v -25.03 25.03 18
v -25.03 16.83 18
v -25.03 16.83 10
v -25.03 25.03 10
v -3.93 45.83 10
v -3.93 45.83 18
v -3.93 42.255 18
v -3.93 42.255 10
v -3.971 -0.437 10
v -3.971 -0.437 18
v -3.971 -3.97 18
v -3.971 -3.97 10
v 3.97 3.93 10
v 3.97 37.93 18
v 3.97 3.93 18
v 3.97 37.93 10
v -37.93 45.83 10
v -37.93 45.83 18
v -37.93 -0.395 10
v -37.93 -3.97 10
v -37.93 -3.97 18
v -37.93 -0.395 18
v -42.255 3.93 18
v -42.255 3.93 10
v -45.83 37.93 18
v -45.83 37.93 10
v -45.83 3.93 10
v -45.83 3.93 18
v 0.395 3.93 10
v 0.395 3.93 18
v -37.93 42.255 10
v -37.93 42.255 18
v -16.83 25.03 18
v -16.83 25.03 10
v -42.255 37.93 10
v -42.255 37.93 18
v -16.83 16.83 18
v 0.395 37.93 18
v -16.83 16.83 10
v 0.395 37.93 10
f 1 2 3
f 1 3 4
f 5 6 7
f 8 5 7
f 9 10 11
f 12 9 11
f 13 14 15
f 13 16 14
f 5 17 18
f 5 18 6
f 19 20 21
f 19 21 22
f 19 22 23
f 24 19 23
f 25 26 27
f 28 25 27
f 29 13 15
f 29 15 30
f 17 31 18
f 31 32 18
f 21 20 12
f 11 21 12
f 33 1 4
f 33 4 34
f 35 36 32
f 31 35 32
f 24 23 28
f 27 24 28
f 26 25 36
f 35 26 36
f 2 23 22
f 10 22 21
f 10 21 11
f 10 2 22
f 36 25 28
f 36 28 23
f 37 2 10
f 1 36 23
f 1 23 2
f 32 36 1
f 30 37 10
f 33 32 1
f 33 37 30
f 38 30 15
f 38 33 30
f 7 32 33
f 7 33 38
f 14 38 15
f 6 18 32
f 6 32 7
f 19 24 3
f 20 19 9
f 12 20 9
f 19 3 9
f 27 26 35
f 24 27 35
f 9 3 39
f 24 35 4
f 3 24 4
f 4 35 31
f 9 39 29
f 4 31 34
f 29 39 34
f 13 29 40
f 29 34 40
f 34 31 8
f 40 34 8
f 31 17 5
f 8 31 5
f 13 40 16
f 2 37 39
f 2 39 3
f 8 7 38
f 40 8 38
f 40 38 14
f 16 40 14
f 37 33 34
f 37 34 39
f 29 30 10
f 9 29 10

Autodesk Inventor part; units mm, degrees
ref_plane "YZ Plane" through (0, 0, 0) normal (1, 0, 0) x (0, 1, 0)
ref_plane "XZ Plane" through (0, 0, 0) normal (0, 1, 0) x (-1, 0, 0)
ref_plane "Work Plane1" through (0, 0, 10) normal (0, 0, 1) x (1, 0, 0)
sketch "Sketch1" plane through (0, 0, 10) normal (0, 0, 1) x (1, 0, 0)
  line L0 (-4.0299, -0.3538) -> (-2.2322, 1.4439) construction
  arc A0 (-1.4439, 2.2322) -> (-2.2322, 1.4439) centre (-0.9299, 0.9299) ccw construction
  line L1 (-1.4439, 2.2322) -> (0.3538, 4.0299) construction
  line L2 (-37.8299, 42.8299) -> (-37.8299, 37.8299) construction
  line L3 (-37.8299, 37.8299) -> (-42.9208, 37.8299) construction
  line L4 (-37.8299, 42.2137) -> (-37.8299, 45.8299) construction
  line L5 (-37.8299, 45.8299) -> (-4.0299, 45.8299) construction
  line L6 (-4.0299, 45.8299) -> (-4.0299, 42.2137) construction
  line L7 (-4.0299, 4.0299) -> (0.3538, 4.0299) projected
  circle A1 centre (-20.9299, 20.9299) radius 17.5 projected
  line L8 (-20.9299, 58.9723) -> (17.1124, 20.9299) construction
  line L9 (17.1124, 20.9299) -> (-20.9299, -17.1124) construction
  line L10 (-20.9299, -17.1124) -> (-58.9723, 20.9299) construction
  line L11 (-58.9723, 20.9299) -> (-20.9299, 58.9723) construction
  line L12 (-20.9299, 58.9723) -> (-20.9299, -17.1124) construction
  line L13 (17.1124, 20.9299) -> (-58.9723, 20.9299) construction
  line L14 (-20.9299, 58.9723) -> (32.8701, 58.9723) construction
  line L15 (-43.4299, 43.4299) -> (1.5701, 43.4299) construction
  line L16 (1.5701, 43.4299) -> (1.5701, -1.5701) construction
  line L17 (1.5701, -1.5701) -> (-43.4299, -1.5701) construction
  line L18 (-43.4299, -1.5701) -> (-43.4299, 43.4299) construction
  line L19 (-43.4299, 43.4299) -> (1.5701, -1.5701) construction
  line L20 (1.5701, 43.4299) -> (-43.4299, -1.5701) construction
  line L21 (-43.4299, 5.3876) -> (-43.4299, 36.4723)
  line L22 (-43.4299, 36.4723) -> (-36.4723, 43.4299)
  line L23 (-36.4723, 43.4299) -> (-5.3876, 43.4299)
  line L24 (-5.3876, 43.4299) -> (1.5701, 36.4723)
  line L25 (1.5701, 36.4723) -> (1.5701, 5.3876)
  line L26 (1.5701, 5.3876) -> (-5.3876, -1.5701)
  line L27 (-5.3876, -1.5701) -> (-36.4723, -1.5701)
  line L28 (-36.4723, -1.5701) -> (-43.4299, 5.3876)
  line L29 (-4.0299, 42.2137) -> (-37.8299, 42.2137) projected
  line L30 (-4.0299, -0.3538) -> (-4.0299, 4.0299) projected
  circle A2 centre (-20.9299, 20.9299) radius 1.5
  line L31 (-10.9299, 10.9299) -> (-30.9299, 10.9299) construction
  line L32 (-30.9299, 10.9299) -> (-30.9299, 30.9299) construction
  line L33 (-30.9299, 30.9299) -> (-10.9299, 30.9299) construction
  line L34 (-10.9299, 30.9299) -> (-10.9299, 10.9299) construction
  line L35 (-10.9299, 10.9299) -> (-30.9299, 30.9299) construction
  line L36 (-30.9299, 10.9299) -> (-10.9299, 30.9299) construction
  circle A3 centre (-30.9299, 30.9299) radius 1.4
  circle A4 centre (-30.9299, 10.9299) radius 1.4
  circle A5 centre (-10.9299, 10.9299) radius 1.4
  line L37 (-45.8299, 37.8299) -> (-42.0723, 37.8299) construction
  line L38 (-42.1723, 37.7299) -> (-45.8299, 37.7299)
  line L39 (-45.8299, 37.7299) -> (-45.8299, 4.1299)
  line L40 (-45.8299, 4.1299) -> (-42.1723, 4.1299)
  line L41 (-42.1723, 4.1299) -> (-42.1723, 37.7299)
  line L42 (-45.8299, 4.0299) -> (-42.0723, 4.0299) construction
  line L43 (-45.8299, 37.8299) -> (-42.0723, 37.8299) projected
  line L44 (-37.7299, 45.8299) -> (-4.1299, 45.8299)
  line L45 (-4.1299, 45.8299) -> (-4.1299, 42.1723)
  line L46 (-4.1299, 42.1723) -> (-37.7299, 42.1723)
  line L47 (-37.7299, 42.1723) -> (-37.7299, 45.8299)
  line L48 (0.4701, 37.8299) -> (0.4701, 4.0299) construction
  line L49 (0.4701, 4.0299) -> (3.9701, 4.0299) construction
  line L50 (3.9701, 37.8299) -> (3.9701, 4.0299) construction
  line L51 (0.4701, 37.8299) -> (3.9701, 37.8299) construction
  line L52 (-45.8299, -3.9701) -> (-4.0299, -3.9701) construction
  line L53 (0.3124, 37.7299) -> (3.9701, 37.7299)
  line L54 (3.9701, 37.7299) -> (3.9701, 4.1299)
  line L55 (3.9701, 4.1299) -> (0.3124, 4.1299)
  line L56 (0.3124, 4.1299) -> (0.3124, 37.7299)
  line L57 (-4.1713, -0.3538) -> (-37.7299, -0.3538)
  line L58 (-37.7299, -0.3538) -> (-37.7299, -3.9701)
  line L59 (-37.7299, -3.9701) -> (-4.1713, -3.9701)
  line L60 (-4.1713, -3.9701) -> (-4.1713, -0.3538)
  point P0 (-37.8299, 4.0299)
  dimension "d18" = 53.8
  dimension "d19" = 45
  dimension "d20" = 53.8
  dimension "d21" = 45
  dimension "d22" = 45
  dimension "d30" = 20
  dimension "d31" = 20
  dimension "d32" = 2.8
  dimension "d33" = 2.8
  dimension "d34" = 2.8
  dimension "d35" = 3
  dimension "d36" = 0.1
  dimension "d37" = 0.1
  dimension "d38" = 0.1
  dimension "d39" = 0.1
extrude "Extrusion1" add sketch "Sketch1" along normal blind 8 contours L30 L26 L57 L28 L41 L22 L46 L24 L56 L7 | L7 L26 L30 | L56 L24 L25 L26 | L26 L25 L24 L53 L54 L55 | L60 L59 L58 L57 L28 L27 L26 | L26 L27 L28 L57 | L46 L22 L29 L24 | L24 L29 L45 | L40 L39 L38 L22 L21 L28 | L28 L21 L22 L41 | L29 L22 L23 L24 | L24 L23 L22 L29 L47 L44 L45 | L47 L29 L22 | A1 | A2 | A3 | A4 | A5
sketch "Skizze4" plane through (0, 0, 18) normal (0, 0, 1) x (1, 0, 0)
  line L0 (-37.7299, 42.1723) -> (-42.1723, 37.7299) projected
  line L1 (-42.1723, 37.7299) -> (-45.8299, 37.7299) projected
  line L2 (-45.8299, 37.7299) -> (-45.8299, 4.1299) construction
  line L3 (-45.8299, 4.1299) -> (-42.1723, 4.1299) projected
  line L4 (-42.1723, 4.1299) -> (-37.6885, -0.3538) projected
  line L5 (-37.6885, -0.3538) -> (-37.7299, -0.3538) projected
  line L6 (-37.7299, -0.3538) -> (-37.7299, -3.9701) projected
  line L7 (-37.7299, -3.9701) -> (-4.1713, -3.9701) construction
  line L8 (-4.1713, -3.9701) -> (-4.1713, -0.3538) projected
  line L9 (-4.1713, -0.3538) -> (0.3124, 4.1299) projected
  line L10 (0.3124, 4.1299) -> (3.9701, 4.1299) projected
  line L11 (3.9701, 4.1299) -> (3.9701, 37.7299) construction
  line L12 (3.9701, 37.7299) -> (0.3124, 37.7299) projected
  line L13 (0.3124, 37.7299) -> (-4.1299, 42.1723) projected
  line L14 (-4.1299, 42.1723) -> (-4.1299, 45.8299) projected
  line L15 (-4.1299, 45.8299) -> (-37.7299, 45.8299) construction
  line L16 (-37.7299, 45.8299) -> (-37.7299, 42.1723) projected
  line L17 (-37.9299, 46.0299) -> (-3.9299, 46.0299) construction
  line L18 (-3.9299, 46.0299) -> (-3.9299, 42.2551)
  line L19 (-3.9299, 42.2551) -> (0.3953, 37.9299)
  line L20 (0.3953, 37.9299) -> (4.1701, 37.9299)
  line L21 (4.1701, 37.9299) -> (4.1701, 3.9299) construction
  line L22 (4.1701, 3.9299) -> (0.3953, 3.9299)
  line L23 (0.3953, 3.9299) -> (-3.9713, -0.4367)
  line L24 (-3.9713, -0.4367) -> (-3.9713, -4.1701)
  line L25 (-3.9713, -4.1701) -> (-37.9299, -4.1701) construction
  line L26 (-37.9299, -4.1701) -> (-37.9299, -0.3953)
  line L27 (-37.9299, -0.3953) -> (-42.2551, 3.9299)
  line L28 (-42.2551, 3.9299) -> (-46.0299, 3.9299)
  line L29 (-46.0299, 3.9299) -> (-46.0299, 37.9299) construction
  line L30 (-46.0299, 37.9299) -> (-42.2551, 37.9299)
  line L31 (-42.2551, 37.9299) -> (-37.9299, 42.2551)
  line L32 (-37.9299, 42.2551) -> (-37.9299, 46.0299)
  line L33 (-45.8299, 37.7299) -> (-45.8299, 37.9299)
  line L34 (-4.1299, 45.8299) -> (-37.7299, 45.8299) projected
  line L35 (-37.7299, 45.8299) -> (-37.9299, 45.8299)
  line L36 (-4.1299, 45.8299) -> (-3.9299, 45.8299)
  line L37 (3.9701, 37.7299) -> (3.9701, 37.9299)
  line L38 (3.9701, 4.1299) -> (3.9701, 37.7299) projected
  line L39 (3.9701, 4.1299) -> (3.9701, 3.9299)
  line L40 (-4.1713, -3.9701) -> (-3.9713, -3.9701)
  line L41 (-37.7299, -3.9701) -> (-37.9299, -3.9701)
  line L42 (-45.8299, 4.1299) -> (-45.8299, 3.9299)
  point P0 (0, 0)
  dimension "d40" = 0.2
extrude "IM_offset" add sketch "Skizze4" against normal up to surface (8 mm away)
ref_plane "Arbeitsebene5" through (-37.9299, 20.9299, 10) normal (0, -1, 0) x (1, 0, 0)
ref_plane "Arbeitsebene6" through (-20.9299, 3.9299, 10) normal (-1, 0, 0) x (0, 0, 1)
sketch "Skizze27" plane through (-37.9299, 20.9299, 10) normal (0, -1, 0) x (1, 0, 0)
  line L0 (17, -13.6) -> (17, 11.6) projected
  point P0 (37.9299, -10)
sketch "Skizze31" plane through (0, 0, 18) normal (0, 0, 1) x (1, 0, 0)
  line L0 (-3.9299, 45.8299) -> (-37.9299, 45.8299) projected
  line L1 (-37.9299, 45.8299) -> (-37.9299, 42.2551) projected
  line L2 (-37.9299, 42.2551) -> (-42.2551, 37.9299) projected
  line L3 (-42.2551, 37.9299) -> (-45.8299, 37.9299) projected
  line L4 (-45.8299, 37.9299) -> (-45.8299, 3.9299) projected
  line L5 (-42.2551, 3.9299) -> (-45.8299, 3.9299) projected
  line L6 (-37.9299, -0.3953) -> (-42.2551, 3.9299) projected
  line L7 (-37.9299, -3.9701) -> (-37.9299, -0.3953) projected
  line L8 (-3.9713, -3.9701) -> (-37.9299, -3.9701) projected
  line L9 (-3.9713, -3.9701) -> (-3.9713, -0.4367) projected
  line L10 (-3.9713, -0.4367) -> (0.3953, 3.9299) projected
  line L11 (0.3953, 3.9299) -> (3.9701, 3.9299) projected
  line L12 (3.9701, 3.9299) -> (3.9701, 37.9299) projected
  line L13 (3.9701, 37.9299) -> (0.3953, 37.9299) projected
  line L14 (0.3953, 37.9299) -> (-3.9299, 42.2551) projected
  line L15 (-3.9299, 42.2551) -> (-3.9299, 45.8299) projected
  line L16 (-3.9713, -3.9701) -> (-37.9299, -3.9701) projected
  line L17 (-45.9799, 54.3054) -> (-45.9799, 21.9906) projected
  line L18 (-3.9299, 45.8299) -> (-37.9299, 45.8299) projected
  circle A0 centre (-20.9299, 20.9299) radius 24.9 construction
  line L19 (-25.0299, 25.0299) -> (-16.8299, 25.0299)
  line L20 (-16.8299, 25.0299) -> (-16.8299, 16.8299)
  line L21 (-16.8299, 16.8299) -> (-25.0299, 16.8299)
  line L22 (-25.0299, 16.8299) -> (-25.0299, 25.0299)
  line L23 (-25.0299, 25.0299) -> (-16.8299, 16.8299)
  line L24 (-16.8299, 25.0299) -> (-25.0299, 16.8299)
  point P0 (0, 0)
  dimension "d169" = 8.2
  dimension "d170" = 8.2
extrude "Extrusion26" cut sketch "Skizze31" against normal blind 10 contours L23 L24 L22 | L19 L24 L23 | L20 L23 L24 | L24 L23 L21
properties part number "20_Cube_Insert_ESP32Cam_angle_v3"
